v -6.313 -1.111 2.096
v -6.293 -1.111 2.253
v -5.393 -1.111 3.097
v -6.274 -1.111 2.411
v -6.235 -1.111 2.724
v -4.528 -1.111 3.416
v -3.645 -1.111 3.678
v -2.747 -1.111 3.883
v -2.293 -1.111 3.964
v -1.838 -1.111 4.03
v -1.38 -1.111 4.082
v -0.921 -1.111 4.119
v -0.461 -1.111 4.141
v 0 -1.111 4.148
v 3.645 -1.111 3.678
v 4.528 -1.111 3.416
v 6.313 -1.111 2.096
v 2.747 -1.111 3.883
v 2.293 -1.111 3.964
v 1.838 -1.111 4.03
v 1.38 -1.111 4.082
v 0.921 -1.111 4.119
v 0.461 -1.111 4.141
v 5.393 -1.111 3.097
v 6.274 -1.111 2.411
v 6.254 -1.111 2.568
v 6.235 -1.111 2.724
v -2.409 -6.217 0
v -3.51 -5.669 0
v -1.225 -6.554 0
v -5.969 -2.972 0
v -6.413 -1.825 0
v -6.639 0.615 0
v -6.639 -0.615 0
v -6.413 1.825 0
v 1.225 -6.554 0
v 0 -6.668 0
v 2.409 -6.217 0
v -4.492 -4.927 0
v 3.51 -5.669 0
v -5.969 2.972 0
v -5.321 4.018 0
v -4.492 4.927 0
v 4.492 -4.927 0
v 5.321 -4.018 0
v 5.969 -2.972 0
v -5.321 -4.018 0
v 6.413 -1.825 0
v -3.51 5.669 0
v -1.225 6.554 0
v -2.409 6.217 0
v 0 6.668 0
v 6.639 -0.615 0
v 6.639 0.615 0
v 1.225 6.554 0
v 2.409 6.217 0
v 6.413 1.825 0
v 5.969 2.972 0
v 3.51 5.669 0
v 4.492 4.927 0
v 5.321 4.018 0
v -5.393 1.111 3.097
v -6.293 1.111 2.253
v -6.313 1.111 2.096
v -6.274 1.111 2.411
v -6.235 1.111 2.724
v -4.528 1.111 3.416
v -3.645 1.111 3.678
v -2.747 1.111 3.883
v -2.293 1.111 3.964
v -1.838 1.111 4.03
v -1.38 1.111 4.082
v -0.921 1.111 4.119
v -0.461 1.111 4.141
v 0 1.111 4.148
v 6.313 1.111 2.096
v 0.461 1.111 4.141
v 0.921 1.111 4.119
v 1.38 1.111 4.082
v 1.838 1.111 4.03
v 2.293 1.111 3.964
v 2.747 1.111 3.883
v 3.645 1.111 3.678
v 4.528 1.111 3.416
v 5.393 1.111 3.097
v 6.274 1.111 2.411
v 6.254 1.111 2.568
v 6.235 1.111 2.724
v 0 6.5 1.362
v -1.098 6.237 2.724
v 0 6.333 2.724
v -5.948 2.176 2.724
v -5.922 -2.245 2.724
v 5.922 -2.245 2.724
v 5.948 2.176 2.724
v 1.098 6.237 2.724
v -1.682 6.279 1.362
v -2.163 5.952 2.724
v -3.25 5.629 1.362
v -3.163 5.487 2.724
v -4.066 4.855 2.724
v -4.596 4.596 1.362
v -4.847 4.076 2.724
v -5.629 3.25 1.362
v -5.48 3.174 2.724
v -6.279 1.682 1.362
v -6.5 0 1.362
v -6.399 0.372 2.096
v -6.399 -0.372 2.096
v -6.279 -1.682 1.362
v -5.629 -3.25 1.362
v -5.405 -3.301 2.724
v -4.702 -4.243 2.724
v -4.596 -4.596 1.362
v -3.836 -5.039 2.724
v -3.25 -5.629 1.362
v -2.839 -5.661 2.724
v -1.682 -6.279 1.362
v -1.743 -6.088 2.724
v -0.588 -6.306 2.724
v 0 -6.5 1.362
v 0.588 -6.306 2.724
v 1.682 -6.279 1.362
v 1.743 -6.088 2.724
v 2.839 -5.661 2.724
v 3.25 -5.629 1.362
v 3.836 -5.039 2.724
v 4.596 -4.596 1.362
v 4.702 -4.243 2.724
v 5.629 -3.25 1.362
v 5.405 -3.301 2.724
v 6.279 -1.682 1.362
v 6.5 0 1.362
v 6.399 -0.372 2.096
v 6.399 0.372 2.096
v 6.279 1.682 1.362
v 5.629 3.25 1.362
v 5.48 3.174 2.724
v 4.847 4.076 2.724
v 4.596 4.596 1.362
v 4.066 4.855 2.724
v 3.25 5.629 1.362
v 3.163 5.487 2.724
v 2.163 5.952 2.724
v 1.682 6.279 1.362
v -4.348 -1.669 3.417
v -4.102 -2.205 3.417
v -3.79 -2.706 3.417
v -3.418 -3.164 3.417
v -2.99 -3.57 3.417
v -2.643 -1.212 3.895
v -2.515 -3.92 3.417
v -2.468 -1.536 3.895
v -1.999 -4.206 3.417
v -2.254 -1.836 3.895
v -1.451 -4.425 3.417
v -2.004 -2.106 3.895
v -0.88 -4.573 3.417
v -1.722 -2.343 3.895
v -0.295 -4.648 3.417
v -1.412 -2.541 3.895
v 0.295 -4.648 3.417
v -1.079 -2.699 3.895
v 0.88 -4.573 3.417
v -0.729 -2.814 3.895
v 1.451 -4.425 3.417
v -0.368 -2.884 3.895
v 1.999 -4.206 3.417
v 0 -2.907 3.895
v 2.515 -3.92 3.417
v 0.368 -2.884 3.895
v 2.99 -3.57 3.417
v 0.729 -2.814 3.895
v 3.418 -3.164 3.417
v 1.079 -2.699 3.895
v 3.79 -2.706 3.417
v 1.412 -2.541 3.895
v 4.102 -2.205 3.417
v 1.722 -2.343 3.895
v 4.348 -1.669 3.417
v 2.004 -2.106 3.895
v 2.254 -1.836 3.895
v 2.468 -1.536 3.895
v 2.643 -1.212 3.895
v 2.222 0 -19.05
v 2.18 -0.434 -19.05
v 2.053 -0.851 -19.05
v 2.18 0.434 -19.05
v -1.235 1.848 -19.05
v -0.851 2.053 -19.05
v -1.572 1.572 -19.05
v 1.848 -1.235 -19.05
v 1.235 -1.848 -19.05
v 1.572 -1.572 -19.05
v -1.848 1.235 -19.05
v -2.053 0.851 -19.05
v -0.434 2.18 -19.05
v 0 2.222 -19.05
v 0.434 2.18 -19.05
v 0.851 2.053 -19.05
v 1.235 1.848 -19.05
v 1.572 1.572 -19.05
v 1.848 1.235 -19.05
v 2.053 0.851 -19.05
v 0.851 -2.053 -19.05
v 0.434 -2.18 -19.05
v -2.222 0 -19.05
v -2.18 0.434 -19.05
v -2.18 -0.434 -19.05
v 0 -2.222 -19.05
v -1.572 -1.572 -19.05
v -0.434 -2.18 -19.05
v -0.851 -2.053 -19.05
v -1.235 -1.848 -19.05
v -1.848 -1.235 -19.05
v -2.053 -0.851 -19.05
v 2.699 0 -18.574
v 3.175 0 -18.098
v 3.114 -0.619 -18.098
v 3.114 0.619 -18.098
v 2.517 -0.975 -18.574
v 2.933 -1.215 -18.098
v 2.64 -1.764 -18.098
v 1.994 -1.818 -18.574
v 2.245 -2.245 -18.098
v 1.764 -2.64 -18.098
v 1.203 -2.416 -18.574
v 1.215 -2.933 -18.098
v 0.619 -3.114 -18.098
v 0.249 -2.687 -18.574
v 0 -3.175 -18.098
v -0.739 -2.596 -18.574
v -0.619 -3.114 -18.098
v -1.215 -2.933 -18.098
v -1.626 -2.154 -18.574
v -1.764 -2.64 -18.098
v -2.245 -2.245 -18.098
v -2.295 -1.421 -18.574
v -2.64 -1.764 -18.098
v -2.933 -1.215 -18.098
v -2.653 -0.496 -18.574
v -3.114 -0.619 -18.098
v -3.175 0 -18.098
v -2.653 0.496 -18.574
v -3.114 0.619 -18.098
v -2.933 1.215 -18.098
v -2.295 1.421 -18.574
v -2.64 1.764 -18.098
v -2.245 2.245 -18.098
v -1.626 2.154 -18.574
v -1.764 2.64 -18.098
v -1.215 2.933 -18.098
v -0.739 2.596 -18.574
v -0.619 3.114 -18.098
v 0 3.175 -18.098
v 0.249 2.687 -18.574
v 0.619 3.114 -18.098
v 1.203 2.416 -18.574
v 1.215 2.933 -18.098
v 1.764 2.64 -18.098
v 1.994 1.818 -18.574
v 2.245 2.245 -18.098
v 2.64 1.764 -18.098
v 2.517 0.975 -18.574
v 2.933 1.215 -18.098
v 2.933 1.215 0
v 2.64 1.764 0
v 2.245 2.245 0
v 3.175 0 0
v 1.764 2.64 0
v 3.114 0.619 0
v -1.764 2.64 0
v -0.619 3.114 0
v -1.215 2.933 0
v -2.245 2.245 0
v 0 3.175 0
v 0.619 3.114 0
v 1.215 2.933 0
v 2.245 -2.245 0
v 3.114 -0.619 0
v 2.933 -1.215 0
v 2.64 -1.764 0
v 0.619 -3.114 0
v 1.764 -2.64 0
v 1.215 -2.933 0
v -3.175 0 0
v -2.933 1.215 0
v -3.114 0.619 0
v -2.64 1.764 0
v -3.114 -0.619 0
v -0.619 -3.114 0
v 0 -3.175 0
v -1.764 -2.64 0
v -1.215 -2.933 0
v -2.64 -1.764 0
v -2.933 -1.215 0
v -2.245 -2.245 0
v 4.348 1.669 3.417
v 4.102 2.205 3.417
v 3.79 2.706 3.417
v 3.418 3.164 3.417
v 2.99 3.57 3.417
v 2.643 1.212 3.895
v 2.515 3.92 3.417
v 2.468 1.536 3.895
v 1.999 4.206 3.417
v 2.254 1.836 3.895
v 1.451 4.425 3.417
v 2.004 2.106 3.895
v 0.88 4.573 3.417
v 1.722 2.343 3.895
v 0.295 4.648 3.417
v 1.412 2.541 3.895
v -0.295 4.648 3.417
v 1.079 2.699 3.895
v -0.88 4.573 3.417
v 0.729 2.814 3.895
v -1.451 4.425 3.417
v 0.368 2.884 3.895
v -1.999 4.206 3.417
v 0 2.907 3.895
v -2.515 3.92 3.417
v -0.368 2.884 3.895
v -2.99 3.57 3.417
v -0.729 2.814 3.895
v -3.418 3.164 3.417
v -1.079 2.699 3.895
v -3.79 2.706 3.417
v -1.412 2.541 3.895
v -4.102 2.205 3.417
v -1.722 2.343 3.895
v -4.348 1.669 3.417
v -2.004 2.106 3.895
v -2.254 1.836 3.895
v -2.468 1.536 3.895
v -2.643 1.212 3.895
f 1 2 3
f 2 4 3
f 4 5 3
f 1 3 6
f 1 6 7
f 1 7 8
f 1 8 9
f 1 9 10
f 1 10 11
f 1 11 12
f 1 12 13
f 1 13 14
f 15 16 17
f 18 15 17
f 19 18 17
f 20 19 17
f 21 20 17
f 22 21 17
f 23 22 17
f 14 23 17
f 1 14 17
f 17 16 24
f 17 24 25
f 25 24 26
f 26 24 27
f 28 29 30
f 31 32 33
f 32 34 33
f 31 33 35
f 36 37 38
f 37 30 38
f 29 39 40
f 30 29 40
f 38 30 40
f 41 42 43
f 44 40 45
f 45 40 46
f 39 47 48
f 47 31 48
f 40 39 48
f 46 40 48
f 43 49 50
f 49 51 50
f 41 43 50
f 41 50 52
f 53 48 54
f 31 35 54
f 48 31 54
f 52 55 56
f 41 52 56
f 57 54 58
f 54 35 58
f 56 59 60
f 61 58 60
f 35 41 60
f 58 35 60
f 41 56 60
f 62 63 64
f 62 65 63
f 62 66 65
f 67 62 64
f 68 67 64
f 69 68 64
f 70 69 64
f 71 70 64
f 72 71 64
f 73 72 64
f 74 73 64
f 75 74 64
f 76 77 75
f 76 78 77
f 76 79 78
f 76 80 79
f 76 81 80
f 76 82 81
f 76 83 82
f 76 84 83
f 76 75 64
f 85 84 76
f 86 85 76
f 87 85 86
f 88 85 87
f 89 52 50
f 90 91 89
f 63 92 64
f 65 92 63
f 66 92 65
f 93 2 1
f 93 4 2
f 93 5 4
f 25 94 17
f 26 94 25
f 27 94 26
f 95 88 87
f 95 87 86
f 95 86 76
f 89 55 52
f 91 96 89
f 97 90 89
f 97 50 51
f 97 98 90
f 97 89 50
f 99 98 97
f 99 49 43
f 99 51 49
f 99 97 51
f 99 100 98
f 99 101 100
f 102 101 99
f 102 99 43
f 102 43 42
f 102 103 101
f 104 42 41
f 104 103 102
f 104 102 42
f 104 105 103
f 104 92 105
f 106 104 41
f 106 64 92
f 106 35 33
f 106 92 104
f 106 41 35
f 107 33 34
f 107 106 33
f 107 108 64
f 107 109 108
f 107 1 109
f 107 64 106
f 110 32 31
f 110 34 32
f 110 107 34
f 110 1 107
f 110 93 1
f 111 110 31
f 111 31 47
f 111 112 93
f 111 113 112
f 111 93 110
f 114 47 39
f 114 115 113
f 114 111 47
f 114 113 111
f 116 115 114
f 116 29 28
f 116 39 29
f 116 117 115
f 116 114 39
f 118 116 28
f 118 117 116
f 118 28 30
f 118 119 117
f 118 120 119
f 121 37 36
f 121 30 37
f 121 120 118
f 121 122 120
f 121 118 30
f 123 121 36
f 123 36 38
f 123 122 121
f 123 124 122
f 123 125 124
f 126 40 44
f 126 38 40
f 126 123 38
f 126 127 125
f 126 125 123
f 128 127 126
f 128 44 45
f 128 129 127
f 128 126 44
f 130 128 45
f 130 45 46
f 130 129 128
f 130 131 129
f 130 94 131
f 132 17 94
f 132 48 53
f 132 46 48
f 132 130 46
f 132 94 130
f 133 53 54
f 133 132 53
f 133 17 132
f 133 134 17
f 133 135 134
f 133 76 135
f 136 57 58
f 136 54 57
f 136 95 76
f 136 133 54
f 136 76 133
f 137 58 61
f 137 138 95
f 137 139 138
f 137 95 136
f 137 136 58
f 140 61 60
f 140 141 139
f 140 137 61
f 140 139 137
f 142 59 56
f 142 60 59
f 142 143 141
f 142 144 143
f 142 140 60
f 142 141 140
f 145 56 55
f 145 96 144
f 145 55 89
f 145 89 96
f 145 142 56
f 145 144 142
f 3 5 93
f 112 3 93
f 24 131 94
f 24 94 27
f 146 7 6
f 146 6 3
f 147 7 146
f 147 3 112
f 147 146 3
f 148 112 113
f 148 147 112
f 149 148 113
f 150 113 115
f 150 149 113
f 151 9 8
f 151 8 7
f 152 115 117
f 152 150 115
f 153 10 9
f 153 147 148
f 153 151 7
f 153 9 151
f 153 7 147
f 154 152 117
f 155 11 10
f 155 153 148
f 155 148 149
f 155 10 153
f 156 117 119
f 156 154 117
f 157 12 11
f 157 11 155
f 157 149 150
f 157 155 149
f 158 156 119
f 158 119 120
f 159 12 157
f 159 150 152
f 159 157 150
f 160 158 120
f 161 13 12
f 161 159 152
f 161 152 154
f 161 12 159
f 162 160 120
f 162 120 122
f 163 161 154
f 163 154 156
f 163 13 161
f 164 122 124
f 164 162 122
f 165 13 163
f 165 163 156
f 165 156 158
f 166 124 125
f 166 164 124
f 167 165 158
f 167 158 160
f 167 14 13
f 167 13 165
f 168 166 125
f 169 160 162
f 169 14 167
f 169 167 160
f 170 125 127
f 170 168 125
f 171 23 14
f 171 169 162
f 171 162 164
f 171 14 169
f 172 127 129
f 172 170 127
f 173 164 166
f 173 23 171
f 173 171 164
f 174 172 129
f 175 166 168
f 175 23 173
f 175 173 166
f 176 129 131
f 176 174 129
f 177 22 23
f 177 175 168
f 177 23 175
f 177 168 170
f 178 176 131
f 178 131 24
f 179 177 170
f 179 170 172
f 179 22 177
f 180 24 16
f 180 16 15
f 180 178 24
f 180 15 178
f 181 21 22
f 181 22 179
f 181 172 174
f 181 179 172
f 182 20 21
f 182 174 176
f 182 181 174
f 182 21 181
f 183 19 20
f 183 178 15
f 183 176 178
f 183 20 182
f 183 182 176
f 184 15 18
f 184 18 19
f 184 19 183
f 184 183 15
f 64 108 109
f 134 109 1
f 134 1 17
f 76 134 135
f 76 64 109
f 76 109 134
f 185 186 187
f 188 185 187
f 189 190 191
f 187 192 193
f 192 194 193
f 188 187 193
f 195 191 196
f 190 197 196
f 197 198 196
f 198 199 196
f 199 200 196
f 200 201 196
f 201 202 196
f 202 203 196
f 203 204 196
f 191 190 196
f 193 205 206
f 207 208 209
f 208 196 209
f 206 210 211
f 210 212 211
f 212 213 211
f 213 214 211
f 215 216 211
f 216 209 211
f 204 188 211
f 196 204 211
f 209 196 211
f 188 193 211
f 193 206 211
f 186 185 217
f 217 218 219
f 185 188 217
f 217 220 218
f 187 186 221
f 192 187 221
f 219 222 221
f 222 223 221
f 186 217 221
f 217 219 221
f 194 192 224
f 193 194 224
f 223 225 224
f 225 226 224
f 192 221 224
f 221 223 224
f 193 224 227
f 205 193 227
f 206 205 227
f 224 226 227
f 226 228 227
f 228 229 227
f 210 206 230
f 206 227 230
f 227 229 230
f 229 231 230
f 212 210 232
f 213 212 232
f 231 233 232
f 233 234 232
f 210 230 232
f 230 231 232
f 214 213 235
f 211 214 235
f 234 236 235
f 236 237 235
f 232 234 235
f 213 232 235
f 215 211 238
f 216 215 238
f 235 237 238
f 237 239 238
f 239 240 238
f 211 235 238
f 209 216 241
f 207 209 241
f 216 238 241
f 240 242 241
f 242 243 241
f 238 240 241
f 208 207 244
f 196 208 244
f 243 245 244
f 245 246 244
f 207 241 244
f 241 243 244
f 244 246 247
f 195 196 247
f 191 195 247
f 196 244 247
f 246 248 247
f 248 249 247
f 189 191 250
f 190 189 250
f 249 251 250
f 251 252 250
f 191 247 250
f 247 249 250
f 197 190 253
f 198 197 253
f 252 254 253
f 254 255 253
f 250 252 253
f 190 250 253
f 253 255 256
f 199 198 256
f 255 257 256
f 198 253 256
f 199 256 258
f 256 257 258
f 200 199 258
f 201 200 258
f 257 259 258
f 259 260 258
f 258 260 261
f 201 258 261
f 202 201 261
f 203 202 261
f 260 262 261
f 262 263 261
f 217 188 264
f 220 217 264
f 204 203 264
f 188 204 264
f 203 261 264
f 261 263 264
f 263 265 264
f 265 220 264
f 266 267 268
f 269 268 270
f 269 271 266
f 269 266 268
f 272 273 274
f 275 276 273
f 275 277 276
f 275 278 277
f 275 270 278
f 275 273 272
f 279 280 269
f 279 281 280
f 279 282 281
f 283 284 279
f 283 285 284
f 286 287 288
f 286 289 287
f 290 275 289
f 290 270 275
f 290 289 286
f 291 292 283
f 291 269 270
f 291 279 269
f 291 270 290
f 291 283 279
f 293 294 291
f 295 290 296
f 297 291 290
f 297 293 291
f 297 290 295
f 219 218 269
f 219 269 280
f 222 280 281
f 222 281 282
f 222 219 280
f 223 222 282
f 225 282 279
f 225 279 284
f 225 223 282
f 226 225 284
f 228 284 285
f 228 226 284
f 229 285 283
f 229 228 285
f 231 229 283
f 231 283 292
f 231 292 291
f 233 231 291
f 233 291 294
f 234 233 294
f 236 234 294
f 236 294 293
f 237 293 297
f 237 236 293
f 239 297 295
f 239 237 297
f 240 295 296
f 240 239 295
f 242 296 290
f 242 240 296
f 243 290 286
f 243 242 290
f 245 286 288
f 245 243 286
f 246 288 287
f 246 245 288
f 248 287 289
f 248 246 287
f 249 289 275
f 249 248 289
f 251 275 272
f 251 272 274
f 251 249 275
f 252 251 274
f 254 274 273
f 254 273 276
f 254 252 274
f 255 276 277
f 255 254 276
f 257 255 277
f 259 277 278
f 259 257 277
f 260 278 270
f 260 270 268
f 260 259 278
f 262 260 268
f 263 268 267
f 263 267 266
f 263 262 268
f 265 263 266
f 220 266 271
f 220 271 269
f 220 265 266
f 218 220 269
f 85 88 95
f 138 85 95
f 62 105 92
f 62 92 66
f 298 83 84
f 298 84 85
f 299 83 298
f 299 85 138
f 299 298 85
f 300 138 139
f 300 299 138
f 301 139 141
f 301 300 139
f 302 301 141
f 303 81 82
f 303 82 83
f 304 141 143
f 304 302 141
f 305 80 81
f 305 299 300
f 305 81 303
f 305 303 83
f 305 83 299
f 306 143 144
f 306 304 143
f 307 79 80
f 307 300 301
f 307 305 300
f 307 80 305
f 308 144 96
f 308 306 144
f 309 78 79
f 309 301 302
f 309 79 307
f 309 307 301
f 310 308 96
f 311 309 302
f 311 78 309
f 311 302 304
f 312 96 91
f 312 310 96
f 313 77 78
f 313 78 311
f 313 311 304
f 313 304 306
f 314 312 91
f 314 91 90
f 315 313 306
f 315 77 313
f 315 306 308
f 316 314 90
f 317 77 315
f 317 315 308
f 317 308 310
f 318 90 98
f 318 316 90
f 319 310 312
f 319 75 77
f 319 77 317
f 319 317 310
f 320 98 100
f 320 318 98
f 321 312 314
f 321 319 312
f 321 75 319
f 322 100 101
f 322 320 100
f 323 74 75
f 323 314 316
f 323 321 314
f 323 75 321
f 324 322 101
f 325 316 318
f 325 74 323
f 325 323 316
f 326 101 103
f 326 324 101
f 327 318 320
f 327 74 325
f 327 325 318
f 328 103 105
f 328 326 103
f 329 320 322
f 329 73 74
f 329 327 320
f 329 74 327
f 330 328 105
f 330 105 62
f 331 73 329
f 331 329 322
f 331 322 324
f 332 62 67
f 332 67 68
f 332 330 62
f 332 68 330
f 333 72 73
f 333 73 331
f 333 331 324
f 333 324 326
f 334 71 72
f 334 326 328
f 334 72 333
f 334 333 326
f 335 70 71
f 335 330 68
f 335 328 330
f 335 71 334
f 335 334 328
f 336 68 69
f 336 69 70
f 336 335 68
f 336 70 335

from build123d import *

# Parameters (mm, degrees)
SKETCH1_R       = 6.6675
EXTRUDE3_DEPTH  = 4.191
SKETCH4_W       = 19.05
SKETCH4_H       = 3.175
CHAMFER2_SIZE   = 0.9525
SKETCH31_W      = 13.335
SKETCH31_H      = 2.2225
EXTRUDE15_DEPTH = 2.0955


with BuildPart() as part:
    # Sketch1 → Extrude3 (new body)
    with BuildSketch(Plane.XY):
        Circle(SKETCH1_R)
    extrude(amount=EXTRUDE3_DEPTH)

    # Sketch11 → Cut-Revolve3 (revolve, cut)
    with BuildSketch(Plane(origin=(0, 0, 0), x_dir=(0, 0, -1), z_dir=(1, 0, 0))):
        with BuildLine():
            Line((-4.445, 6.9342), (0, 6.9342))
            Line((0, 6.9342), (0, 6.6675))
            Line((0, 6.6675), (-2.72415, 6.333016438))
            ThreePointArc((-2.72415, 6.333016438), (-3.819496854, 3.250336372), (-4.191, 0))
            Line((-4.191, 0), (-4.445, 0))
            Line((-4.445, 0), (-4.445, 6.9342))
        make_face()
    revolve(axis=Axis((0, 0, 0), (0, 0, 1)), mode=Mode.SUBTRACT)

    # Sketch31 → Extrude15 (cut)
    with BuildSketch(Plane.XY.offset(4.191)):
        Rectangle(SKETCH31_W, SKETCH31_H)
    extrude(amount=-EXTRUDE15_DEPTH, mode=Mode.SUBTRACT)


with BuildPart() as body_2:
    # Sketch4 → Revolve1 (revolve)
    with BuildSketch(Plane(origin=(0, 0, 0), x_dir=(0, 0, -1), z_dir=(1, 0, 0)), mode=Mode.PRIVATE) as revolve1_sk:
        with Locations((9.525, 1.5875)):
            Rectangle(SKETCH4_W, SKETCH4_H)
    revolve(revolve1_sk.sketch.rotate(Axis((0, 0, 0), (0, 0, -1)), 90), axis=Axis((0, 0, 0), (0, 0, -1)))

    # Chamfer2
    chamfer2_edges = [body_2.edges().sort_by_distance(p)[0] for p in [
        (-3.175, 0, -19.05),
    ]]
    chamfer(chamfer2_edges, length=CHAMFER2_SIZE)


solid = Compound([part.part, body_2.part])
